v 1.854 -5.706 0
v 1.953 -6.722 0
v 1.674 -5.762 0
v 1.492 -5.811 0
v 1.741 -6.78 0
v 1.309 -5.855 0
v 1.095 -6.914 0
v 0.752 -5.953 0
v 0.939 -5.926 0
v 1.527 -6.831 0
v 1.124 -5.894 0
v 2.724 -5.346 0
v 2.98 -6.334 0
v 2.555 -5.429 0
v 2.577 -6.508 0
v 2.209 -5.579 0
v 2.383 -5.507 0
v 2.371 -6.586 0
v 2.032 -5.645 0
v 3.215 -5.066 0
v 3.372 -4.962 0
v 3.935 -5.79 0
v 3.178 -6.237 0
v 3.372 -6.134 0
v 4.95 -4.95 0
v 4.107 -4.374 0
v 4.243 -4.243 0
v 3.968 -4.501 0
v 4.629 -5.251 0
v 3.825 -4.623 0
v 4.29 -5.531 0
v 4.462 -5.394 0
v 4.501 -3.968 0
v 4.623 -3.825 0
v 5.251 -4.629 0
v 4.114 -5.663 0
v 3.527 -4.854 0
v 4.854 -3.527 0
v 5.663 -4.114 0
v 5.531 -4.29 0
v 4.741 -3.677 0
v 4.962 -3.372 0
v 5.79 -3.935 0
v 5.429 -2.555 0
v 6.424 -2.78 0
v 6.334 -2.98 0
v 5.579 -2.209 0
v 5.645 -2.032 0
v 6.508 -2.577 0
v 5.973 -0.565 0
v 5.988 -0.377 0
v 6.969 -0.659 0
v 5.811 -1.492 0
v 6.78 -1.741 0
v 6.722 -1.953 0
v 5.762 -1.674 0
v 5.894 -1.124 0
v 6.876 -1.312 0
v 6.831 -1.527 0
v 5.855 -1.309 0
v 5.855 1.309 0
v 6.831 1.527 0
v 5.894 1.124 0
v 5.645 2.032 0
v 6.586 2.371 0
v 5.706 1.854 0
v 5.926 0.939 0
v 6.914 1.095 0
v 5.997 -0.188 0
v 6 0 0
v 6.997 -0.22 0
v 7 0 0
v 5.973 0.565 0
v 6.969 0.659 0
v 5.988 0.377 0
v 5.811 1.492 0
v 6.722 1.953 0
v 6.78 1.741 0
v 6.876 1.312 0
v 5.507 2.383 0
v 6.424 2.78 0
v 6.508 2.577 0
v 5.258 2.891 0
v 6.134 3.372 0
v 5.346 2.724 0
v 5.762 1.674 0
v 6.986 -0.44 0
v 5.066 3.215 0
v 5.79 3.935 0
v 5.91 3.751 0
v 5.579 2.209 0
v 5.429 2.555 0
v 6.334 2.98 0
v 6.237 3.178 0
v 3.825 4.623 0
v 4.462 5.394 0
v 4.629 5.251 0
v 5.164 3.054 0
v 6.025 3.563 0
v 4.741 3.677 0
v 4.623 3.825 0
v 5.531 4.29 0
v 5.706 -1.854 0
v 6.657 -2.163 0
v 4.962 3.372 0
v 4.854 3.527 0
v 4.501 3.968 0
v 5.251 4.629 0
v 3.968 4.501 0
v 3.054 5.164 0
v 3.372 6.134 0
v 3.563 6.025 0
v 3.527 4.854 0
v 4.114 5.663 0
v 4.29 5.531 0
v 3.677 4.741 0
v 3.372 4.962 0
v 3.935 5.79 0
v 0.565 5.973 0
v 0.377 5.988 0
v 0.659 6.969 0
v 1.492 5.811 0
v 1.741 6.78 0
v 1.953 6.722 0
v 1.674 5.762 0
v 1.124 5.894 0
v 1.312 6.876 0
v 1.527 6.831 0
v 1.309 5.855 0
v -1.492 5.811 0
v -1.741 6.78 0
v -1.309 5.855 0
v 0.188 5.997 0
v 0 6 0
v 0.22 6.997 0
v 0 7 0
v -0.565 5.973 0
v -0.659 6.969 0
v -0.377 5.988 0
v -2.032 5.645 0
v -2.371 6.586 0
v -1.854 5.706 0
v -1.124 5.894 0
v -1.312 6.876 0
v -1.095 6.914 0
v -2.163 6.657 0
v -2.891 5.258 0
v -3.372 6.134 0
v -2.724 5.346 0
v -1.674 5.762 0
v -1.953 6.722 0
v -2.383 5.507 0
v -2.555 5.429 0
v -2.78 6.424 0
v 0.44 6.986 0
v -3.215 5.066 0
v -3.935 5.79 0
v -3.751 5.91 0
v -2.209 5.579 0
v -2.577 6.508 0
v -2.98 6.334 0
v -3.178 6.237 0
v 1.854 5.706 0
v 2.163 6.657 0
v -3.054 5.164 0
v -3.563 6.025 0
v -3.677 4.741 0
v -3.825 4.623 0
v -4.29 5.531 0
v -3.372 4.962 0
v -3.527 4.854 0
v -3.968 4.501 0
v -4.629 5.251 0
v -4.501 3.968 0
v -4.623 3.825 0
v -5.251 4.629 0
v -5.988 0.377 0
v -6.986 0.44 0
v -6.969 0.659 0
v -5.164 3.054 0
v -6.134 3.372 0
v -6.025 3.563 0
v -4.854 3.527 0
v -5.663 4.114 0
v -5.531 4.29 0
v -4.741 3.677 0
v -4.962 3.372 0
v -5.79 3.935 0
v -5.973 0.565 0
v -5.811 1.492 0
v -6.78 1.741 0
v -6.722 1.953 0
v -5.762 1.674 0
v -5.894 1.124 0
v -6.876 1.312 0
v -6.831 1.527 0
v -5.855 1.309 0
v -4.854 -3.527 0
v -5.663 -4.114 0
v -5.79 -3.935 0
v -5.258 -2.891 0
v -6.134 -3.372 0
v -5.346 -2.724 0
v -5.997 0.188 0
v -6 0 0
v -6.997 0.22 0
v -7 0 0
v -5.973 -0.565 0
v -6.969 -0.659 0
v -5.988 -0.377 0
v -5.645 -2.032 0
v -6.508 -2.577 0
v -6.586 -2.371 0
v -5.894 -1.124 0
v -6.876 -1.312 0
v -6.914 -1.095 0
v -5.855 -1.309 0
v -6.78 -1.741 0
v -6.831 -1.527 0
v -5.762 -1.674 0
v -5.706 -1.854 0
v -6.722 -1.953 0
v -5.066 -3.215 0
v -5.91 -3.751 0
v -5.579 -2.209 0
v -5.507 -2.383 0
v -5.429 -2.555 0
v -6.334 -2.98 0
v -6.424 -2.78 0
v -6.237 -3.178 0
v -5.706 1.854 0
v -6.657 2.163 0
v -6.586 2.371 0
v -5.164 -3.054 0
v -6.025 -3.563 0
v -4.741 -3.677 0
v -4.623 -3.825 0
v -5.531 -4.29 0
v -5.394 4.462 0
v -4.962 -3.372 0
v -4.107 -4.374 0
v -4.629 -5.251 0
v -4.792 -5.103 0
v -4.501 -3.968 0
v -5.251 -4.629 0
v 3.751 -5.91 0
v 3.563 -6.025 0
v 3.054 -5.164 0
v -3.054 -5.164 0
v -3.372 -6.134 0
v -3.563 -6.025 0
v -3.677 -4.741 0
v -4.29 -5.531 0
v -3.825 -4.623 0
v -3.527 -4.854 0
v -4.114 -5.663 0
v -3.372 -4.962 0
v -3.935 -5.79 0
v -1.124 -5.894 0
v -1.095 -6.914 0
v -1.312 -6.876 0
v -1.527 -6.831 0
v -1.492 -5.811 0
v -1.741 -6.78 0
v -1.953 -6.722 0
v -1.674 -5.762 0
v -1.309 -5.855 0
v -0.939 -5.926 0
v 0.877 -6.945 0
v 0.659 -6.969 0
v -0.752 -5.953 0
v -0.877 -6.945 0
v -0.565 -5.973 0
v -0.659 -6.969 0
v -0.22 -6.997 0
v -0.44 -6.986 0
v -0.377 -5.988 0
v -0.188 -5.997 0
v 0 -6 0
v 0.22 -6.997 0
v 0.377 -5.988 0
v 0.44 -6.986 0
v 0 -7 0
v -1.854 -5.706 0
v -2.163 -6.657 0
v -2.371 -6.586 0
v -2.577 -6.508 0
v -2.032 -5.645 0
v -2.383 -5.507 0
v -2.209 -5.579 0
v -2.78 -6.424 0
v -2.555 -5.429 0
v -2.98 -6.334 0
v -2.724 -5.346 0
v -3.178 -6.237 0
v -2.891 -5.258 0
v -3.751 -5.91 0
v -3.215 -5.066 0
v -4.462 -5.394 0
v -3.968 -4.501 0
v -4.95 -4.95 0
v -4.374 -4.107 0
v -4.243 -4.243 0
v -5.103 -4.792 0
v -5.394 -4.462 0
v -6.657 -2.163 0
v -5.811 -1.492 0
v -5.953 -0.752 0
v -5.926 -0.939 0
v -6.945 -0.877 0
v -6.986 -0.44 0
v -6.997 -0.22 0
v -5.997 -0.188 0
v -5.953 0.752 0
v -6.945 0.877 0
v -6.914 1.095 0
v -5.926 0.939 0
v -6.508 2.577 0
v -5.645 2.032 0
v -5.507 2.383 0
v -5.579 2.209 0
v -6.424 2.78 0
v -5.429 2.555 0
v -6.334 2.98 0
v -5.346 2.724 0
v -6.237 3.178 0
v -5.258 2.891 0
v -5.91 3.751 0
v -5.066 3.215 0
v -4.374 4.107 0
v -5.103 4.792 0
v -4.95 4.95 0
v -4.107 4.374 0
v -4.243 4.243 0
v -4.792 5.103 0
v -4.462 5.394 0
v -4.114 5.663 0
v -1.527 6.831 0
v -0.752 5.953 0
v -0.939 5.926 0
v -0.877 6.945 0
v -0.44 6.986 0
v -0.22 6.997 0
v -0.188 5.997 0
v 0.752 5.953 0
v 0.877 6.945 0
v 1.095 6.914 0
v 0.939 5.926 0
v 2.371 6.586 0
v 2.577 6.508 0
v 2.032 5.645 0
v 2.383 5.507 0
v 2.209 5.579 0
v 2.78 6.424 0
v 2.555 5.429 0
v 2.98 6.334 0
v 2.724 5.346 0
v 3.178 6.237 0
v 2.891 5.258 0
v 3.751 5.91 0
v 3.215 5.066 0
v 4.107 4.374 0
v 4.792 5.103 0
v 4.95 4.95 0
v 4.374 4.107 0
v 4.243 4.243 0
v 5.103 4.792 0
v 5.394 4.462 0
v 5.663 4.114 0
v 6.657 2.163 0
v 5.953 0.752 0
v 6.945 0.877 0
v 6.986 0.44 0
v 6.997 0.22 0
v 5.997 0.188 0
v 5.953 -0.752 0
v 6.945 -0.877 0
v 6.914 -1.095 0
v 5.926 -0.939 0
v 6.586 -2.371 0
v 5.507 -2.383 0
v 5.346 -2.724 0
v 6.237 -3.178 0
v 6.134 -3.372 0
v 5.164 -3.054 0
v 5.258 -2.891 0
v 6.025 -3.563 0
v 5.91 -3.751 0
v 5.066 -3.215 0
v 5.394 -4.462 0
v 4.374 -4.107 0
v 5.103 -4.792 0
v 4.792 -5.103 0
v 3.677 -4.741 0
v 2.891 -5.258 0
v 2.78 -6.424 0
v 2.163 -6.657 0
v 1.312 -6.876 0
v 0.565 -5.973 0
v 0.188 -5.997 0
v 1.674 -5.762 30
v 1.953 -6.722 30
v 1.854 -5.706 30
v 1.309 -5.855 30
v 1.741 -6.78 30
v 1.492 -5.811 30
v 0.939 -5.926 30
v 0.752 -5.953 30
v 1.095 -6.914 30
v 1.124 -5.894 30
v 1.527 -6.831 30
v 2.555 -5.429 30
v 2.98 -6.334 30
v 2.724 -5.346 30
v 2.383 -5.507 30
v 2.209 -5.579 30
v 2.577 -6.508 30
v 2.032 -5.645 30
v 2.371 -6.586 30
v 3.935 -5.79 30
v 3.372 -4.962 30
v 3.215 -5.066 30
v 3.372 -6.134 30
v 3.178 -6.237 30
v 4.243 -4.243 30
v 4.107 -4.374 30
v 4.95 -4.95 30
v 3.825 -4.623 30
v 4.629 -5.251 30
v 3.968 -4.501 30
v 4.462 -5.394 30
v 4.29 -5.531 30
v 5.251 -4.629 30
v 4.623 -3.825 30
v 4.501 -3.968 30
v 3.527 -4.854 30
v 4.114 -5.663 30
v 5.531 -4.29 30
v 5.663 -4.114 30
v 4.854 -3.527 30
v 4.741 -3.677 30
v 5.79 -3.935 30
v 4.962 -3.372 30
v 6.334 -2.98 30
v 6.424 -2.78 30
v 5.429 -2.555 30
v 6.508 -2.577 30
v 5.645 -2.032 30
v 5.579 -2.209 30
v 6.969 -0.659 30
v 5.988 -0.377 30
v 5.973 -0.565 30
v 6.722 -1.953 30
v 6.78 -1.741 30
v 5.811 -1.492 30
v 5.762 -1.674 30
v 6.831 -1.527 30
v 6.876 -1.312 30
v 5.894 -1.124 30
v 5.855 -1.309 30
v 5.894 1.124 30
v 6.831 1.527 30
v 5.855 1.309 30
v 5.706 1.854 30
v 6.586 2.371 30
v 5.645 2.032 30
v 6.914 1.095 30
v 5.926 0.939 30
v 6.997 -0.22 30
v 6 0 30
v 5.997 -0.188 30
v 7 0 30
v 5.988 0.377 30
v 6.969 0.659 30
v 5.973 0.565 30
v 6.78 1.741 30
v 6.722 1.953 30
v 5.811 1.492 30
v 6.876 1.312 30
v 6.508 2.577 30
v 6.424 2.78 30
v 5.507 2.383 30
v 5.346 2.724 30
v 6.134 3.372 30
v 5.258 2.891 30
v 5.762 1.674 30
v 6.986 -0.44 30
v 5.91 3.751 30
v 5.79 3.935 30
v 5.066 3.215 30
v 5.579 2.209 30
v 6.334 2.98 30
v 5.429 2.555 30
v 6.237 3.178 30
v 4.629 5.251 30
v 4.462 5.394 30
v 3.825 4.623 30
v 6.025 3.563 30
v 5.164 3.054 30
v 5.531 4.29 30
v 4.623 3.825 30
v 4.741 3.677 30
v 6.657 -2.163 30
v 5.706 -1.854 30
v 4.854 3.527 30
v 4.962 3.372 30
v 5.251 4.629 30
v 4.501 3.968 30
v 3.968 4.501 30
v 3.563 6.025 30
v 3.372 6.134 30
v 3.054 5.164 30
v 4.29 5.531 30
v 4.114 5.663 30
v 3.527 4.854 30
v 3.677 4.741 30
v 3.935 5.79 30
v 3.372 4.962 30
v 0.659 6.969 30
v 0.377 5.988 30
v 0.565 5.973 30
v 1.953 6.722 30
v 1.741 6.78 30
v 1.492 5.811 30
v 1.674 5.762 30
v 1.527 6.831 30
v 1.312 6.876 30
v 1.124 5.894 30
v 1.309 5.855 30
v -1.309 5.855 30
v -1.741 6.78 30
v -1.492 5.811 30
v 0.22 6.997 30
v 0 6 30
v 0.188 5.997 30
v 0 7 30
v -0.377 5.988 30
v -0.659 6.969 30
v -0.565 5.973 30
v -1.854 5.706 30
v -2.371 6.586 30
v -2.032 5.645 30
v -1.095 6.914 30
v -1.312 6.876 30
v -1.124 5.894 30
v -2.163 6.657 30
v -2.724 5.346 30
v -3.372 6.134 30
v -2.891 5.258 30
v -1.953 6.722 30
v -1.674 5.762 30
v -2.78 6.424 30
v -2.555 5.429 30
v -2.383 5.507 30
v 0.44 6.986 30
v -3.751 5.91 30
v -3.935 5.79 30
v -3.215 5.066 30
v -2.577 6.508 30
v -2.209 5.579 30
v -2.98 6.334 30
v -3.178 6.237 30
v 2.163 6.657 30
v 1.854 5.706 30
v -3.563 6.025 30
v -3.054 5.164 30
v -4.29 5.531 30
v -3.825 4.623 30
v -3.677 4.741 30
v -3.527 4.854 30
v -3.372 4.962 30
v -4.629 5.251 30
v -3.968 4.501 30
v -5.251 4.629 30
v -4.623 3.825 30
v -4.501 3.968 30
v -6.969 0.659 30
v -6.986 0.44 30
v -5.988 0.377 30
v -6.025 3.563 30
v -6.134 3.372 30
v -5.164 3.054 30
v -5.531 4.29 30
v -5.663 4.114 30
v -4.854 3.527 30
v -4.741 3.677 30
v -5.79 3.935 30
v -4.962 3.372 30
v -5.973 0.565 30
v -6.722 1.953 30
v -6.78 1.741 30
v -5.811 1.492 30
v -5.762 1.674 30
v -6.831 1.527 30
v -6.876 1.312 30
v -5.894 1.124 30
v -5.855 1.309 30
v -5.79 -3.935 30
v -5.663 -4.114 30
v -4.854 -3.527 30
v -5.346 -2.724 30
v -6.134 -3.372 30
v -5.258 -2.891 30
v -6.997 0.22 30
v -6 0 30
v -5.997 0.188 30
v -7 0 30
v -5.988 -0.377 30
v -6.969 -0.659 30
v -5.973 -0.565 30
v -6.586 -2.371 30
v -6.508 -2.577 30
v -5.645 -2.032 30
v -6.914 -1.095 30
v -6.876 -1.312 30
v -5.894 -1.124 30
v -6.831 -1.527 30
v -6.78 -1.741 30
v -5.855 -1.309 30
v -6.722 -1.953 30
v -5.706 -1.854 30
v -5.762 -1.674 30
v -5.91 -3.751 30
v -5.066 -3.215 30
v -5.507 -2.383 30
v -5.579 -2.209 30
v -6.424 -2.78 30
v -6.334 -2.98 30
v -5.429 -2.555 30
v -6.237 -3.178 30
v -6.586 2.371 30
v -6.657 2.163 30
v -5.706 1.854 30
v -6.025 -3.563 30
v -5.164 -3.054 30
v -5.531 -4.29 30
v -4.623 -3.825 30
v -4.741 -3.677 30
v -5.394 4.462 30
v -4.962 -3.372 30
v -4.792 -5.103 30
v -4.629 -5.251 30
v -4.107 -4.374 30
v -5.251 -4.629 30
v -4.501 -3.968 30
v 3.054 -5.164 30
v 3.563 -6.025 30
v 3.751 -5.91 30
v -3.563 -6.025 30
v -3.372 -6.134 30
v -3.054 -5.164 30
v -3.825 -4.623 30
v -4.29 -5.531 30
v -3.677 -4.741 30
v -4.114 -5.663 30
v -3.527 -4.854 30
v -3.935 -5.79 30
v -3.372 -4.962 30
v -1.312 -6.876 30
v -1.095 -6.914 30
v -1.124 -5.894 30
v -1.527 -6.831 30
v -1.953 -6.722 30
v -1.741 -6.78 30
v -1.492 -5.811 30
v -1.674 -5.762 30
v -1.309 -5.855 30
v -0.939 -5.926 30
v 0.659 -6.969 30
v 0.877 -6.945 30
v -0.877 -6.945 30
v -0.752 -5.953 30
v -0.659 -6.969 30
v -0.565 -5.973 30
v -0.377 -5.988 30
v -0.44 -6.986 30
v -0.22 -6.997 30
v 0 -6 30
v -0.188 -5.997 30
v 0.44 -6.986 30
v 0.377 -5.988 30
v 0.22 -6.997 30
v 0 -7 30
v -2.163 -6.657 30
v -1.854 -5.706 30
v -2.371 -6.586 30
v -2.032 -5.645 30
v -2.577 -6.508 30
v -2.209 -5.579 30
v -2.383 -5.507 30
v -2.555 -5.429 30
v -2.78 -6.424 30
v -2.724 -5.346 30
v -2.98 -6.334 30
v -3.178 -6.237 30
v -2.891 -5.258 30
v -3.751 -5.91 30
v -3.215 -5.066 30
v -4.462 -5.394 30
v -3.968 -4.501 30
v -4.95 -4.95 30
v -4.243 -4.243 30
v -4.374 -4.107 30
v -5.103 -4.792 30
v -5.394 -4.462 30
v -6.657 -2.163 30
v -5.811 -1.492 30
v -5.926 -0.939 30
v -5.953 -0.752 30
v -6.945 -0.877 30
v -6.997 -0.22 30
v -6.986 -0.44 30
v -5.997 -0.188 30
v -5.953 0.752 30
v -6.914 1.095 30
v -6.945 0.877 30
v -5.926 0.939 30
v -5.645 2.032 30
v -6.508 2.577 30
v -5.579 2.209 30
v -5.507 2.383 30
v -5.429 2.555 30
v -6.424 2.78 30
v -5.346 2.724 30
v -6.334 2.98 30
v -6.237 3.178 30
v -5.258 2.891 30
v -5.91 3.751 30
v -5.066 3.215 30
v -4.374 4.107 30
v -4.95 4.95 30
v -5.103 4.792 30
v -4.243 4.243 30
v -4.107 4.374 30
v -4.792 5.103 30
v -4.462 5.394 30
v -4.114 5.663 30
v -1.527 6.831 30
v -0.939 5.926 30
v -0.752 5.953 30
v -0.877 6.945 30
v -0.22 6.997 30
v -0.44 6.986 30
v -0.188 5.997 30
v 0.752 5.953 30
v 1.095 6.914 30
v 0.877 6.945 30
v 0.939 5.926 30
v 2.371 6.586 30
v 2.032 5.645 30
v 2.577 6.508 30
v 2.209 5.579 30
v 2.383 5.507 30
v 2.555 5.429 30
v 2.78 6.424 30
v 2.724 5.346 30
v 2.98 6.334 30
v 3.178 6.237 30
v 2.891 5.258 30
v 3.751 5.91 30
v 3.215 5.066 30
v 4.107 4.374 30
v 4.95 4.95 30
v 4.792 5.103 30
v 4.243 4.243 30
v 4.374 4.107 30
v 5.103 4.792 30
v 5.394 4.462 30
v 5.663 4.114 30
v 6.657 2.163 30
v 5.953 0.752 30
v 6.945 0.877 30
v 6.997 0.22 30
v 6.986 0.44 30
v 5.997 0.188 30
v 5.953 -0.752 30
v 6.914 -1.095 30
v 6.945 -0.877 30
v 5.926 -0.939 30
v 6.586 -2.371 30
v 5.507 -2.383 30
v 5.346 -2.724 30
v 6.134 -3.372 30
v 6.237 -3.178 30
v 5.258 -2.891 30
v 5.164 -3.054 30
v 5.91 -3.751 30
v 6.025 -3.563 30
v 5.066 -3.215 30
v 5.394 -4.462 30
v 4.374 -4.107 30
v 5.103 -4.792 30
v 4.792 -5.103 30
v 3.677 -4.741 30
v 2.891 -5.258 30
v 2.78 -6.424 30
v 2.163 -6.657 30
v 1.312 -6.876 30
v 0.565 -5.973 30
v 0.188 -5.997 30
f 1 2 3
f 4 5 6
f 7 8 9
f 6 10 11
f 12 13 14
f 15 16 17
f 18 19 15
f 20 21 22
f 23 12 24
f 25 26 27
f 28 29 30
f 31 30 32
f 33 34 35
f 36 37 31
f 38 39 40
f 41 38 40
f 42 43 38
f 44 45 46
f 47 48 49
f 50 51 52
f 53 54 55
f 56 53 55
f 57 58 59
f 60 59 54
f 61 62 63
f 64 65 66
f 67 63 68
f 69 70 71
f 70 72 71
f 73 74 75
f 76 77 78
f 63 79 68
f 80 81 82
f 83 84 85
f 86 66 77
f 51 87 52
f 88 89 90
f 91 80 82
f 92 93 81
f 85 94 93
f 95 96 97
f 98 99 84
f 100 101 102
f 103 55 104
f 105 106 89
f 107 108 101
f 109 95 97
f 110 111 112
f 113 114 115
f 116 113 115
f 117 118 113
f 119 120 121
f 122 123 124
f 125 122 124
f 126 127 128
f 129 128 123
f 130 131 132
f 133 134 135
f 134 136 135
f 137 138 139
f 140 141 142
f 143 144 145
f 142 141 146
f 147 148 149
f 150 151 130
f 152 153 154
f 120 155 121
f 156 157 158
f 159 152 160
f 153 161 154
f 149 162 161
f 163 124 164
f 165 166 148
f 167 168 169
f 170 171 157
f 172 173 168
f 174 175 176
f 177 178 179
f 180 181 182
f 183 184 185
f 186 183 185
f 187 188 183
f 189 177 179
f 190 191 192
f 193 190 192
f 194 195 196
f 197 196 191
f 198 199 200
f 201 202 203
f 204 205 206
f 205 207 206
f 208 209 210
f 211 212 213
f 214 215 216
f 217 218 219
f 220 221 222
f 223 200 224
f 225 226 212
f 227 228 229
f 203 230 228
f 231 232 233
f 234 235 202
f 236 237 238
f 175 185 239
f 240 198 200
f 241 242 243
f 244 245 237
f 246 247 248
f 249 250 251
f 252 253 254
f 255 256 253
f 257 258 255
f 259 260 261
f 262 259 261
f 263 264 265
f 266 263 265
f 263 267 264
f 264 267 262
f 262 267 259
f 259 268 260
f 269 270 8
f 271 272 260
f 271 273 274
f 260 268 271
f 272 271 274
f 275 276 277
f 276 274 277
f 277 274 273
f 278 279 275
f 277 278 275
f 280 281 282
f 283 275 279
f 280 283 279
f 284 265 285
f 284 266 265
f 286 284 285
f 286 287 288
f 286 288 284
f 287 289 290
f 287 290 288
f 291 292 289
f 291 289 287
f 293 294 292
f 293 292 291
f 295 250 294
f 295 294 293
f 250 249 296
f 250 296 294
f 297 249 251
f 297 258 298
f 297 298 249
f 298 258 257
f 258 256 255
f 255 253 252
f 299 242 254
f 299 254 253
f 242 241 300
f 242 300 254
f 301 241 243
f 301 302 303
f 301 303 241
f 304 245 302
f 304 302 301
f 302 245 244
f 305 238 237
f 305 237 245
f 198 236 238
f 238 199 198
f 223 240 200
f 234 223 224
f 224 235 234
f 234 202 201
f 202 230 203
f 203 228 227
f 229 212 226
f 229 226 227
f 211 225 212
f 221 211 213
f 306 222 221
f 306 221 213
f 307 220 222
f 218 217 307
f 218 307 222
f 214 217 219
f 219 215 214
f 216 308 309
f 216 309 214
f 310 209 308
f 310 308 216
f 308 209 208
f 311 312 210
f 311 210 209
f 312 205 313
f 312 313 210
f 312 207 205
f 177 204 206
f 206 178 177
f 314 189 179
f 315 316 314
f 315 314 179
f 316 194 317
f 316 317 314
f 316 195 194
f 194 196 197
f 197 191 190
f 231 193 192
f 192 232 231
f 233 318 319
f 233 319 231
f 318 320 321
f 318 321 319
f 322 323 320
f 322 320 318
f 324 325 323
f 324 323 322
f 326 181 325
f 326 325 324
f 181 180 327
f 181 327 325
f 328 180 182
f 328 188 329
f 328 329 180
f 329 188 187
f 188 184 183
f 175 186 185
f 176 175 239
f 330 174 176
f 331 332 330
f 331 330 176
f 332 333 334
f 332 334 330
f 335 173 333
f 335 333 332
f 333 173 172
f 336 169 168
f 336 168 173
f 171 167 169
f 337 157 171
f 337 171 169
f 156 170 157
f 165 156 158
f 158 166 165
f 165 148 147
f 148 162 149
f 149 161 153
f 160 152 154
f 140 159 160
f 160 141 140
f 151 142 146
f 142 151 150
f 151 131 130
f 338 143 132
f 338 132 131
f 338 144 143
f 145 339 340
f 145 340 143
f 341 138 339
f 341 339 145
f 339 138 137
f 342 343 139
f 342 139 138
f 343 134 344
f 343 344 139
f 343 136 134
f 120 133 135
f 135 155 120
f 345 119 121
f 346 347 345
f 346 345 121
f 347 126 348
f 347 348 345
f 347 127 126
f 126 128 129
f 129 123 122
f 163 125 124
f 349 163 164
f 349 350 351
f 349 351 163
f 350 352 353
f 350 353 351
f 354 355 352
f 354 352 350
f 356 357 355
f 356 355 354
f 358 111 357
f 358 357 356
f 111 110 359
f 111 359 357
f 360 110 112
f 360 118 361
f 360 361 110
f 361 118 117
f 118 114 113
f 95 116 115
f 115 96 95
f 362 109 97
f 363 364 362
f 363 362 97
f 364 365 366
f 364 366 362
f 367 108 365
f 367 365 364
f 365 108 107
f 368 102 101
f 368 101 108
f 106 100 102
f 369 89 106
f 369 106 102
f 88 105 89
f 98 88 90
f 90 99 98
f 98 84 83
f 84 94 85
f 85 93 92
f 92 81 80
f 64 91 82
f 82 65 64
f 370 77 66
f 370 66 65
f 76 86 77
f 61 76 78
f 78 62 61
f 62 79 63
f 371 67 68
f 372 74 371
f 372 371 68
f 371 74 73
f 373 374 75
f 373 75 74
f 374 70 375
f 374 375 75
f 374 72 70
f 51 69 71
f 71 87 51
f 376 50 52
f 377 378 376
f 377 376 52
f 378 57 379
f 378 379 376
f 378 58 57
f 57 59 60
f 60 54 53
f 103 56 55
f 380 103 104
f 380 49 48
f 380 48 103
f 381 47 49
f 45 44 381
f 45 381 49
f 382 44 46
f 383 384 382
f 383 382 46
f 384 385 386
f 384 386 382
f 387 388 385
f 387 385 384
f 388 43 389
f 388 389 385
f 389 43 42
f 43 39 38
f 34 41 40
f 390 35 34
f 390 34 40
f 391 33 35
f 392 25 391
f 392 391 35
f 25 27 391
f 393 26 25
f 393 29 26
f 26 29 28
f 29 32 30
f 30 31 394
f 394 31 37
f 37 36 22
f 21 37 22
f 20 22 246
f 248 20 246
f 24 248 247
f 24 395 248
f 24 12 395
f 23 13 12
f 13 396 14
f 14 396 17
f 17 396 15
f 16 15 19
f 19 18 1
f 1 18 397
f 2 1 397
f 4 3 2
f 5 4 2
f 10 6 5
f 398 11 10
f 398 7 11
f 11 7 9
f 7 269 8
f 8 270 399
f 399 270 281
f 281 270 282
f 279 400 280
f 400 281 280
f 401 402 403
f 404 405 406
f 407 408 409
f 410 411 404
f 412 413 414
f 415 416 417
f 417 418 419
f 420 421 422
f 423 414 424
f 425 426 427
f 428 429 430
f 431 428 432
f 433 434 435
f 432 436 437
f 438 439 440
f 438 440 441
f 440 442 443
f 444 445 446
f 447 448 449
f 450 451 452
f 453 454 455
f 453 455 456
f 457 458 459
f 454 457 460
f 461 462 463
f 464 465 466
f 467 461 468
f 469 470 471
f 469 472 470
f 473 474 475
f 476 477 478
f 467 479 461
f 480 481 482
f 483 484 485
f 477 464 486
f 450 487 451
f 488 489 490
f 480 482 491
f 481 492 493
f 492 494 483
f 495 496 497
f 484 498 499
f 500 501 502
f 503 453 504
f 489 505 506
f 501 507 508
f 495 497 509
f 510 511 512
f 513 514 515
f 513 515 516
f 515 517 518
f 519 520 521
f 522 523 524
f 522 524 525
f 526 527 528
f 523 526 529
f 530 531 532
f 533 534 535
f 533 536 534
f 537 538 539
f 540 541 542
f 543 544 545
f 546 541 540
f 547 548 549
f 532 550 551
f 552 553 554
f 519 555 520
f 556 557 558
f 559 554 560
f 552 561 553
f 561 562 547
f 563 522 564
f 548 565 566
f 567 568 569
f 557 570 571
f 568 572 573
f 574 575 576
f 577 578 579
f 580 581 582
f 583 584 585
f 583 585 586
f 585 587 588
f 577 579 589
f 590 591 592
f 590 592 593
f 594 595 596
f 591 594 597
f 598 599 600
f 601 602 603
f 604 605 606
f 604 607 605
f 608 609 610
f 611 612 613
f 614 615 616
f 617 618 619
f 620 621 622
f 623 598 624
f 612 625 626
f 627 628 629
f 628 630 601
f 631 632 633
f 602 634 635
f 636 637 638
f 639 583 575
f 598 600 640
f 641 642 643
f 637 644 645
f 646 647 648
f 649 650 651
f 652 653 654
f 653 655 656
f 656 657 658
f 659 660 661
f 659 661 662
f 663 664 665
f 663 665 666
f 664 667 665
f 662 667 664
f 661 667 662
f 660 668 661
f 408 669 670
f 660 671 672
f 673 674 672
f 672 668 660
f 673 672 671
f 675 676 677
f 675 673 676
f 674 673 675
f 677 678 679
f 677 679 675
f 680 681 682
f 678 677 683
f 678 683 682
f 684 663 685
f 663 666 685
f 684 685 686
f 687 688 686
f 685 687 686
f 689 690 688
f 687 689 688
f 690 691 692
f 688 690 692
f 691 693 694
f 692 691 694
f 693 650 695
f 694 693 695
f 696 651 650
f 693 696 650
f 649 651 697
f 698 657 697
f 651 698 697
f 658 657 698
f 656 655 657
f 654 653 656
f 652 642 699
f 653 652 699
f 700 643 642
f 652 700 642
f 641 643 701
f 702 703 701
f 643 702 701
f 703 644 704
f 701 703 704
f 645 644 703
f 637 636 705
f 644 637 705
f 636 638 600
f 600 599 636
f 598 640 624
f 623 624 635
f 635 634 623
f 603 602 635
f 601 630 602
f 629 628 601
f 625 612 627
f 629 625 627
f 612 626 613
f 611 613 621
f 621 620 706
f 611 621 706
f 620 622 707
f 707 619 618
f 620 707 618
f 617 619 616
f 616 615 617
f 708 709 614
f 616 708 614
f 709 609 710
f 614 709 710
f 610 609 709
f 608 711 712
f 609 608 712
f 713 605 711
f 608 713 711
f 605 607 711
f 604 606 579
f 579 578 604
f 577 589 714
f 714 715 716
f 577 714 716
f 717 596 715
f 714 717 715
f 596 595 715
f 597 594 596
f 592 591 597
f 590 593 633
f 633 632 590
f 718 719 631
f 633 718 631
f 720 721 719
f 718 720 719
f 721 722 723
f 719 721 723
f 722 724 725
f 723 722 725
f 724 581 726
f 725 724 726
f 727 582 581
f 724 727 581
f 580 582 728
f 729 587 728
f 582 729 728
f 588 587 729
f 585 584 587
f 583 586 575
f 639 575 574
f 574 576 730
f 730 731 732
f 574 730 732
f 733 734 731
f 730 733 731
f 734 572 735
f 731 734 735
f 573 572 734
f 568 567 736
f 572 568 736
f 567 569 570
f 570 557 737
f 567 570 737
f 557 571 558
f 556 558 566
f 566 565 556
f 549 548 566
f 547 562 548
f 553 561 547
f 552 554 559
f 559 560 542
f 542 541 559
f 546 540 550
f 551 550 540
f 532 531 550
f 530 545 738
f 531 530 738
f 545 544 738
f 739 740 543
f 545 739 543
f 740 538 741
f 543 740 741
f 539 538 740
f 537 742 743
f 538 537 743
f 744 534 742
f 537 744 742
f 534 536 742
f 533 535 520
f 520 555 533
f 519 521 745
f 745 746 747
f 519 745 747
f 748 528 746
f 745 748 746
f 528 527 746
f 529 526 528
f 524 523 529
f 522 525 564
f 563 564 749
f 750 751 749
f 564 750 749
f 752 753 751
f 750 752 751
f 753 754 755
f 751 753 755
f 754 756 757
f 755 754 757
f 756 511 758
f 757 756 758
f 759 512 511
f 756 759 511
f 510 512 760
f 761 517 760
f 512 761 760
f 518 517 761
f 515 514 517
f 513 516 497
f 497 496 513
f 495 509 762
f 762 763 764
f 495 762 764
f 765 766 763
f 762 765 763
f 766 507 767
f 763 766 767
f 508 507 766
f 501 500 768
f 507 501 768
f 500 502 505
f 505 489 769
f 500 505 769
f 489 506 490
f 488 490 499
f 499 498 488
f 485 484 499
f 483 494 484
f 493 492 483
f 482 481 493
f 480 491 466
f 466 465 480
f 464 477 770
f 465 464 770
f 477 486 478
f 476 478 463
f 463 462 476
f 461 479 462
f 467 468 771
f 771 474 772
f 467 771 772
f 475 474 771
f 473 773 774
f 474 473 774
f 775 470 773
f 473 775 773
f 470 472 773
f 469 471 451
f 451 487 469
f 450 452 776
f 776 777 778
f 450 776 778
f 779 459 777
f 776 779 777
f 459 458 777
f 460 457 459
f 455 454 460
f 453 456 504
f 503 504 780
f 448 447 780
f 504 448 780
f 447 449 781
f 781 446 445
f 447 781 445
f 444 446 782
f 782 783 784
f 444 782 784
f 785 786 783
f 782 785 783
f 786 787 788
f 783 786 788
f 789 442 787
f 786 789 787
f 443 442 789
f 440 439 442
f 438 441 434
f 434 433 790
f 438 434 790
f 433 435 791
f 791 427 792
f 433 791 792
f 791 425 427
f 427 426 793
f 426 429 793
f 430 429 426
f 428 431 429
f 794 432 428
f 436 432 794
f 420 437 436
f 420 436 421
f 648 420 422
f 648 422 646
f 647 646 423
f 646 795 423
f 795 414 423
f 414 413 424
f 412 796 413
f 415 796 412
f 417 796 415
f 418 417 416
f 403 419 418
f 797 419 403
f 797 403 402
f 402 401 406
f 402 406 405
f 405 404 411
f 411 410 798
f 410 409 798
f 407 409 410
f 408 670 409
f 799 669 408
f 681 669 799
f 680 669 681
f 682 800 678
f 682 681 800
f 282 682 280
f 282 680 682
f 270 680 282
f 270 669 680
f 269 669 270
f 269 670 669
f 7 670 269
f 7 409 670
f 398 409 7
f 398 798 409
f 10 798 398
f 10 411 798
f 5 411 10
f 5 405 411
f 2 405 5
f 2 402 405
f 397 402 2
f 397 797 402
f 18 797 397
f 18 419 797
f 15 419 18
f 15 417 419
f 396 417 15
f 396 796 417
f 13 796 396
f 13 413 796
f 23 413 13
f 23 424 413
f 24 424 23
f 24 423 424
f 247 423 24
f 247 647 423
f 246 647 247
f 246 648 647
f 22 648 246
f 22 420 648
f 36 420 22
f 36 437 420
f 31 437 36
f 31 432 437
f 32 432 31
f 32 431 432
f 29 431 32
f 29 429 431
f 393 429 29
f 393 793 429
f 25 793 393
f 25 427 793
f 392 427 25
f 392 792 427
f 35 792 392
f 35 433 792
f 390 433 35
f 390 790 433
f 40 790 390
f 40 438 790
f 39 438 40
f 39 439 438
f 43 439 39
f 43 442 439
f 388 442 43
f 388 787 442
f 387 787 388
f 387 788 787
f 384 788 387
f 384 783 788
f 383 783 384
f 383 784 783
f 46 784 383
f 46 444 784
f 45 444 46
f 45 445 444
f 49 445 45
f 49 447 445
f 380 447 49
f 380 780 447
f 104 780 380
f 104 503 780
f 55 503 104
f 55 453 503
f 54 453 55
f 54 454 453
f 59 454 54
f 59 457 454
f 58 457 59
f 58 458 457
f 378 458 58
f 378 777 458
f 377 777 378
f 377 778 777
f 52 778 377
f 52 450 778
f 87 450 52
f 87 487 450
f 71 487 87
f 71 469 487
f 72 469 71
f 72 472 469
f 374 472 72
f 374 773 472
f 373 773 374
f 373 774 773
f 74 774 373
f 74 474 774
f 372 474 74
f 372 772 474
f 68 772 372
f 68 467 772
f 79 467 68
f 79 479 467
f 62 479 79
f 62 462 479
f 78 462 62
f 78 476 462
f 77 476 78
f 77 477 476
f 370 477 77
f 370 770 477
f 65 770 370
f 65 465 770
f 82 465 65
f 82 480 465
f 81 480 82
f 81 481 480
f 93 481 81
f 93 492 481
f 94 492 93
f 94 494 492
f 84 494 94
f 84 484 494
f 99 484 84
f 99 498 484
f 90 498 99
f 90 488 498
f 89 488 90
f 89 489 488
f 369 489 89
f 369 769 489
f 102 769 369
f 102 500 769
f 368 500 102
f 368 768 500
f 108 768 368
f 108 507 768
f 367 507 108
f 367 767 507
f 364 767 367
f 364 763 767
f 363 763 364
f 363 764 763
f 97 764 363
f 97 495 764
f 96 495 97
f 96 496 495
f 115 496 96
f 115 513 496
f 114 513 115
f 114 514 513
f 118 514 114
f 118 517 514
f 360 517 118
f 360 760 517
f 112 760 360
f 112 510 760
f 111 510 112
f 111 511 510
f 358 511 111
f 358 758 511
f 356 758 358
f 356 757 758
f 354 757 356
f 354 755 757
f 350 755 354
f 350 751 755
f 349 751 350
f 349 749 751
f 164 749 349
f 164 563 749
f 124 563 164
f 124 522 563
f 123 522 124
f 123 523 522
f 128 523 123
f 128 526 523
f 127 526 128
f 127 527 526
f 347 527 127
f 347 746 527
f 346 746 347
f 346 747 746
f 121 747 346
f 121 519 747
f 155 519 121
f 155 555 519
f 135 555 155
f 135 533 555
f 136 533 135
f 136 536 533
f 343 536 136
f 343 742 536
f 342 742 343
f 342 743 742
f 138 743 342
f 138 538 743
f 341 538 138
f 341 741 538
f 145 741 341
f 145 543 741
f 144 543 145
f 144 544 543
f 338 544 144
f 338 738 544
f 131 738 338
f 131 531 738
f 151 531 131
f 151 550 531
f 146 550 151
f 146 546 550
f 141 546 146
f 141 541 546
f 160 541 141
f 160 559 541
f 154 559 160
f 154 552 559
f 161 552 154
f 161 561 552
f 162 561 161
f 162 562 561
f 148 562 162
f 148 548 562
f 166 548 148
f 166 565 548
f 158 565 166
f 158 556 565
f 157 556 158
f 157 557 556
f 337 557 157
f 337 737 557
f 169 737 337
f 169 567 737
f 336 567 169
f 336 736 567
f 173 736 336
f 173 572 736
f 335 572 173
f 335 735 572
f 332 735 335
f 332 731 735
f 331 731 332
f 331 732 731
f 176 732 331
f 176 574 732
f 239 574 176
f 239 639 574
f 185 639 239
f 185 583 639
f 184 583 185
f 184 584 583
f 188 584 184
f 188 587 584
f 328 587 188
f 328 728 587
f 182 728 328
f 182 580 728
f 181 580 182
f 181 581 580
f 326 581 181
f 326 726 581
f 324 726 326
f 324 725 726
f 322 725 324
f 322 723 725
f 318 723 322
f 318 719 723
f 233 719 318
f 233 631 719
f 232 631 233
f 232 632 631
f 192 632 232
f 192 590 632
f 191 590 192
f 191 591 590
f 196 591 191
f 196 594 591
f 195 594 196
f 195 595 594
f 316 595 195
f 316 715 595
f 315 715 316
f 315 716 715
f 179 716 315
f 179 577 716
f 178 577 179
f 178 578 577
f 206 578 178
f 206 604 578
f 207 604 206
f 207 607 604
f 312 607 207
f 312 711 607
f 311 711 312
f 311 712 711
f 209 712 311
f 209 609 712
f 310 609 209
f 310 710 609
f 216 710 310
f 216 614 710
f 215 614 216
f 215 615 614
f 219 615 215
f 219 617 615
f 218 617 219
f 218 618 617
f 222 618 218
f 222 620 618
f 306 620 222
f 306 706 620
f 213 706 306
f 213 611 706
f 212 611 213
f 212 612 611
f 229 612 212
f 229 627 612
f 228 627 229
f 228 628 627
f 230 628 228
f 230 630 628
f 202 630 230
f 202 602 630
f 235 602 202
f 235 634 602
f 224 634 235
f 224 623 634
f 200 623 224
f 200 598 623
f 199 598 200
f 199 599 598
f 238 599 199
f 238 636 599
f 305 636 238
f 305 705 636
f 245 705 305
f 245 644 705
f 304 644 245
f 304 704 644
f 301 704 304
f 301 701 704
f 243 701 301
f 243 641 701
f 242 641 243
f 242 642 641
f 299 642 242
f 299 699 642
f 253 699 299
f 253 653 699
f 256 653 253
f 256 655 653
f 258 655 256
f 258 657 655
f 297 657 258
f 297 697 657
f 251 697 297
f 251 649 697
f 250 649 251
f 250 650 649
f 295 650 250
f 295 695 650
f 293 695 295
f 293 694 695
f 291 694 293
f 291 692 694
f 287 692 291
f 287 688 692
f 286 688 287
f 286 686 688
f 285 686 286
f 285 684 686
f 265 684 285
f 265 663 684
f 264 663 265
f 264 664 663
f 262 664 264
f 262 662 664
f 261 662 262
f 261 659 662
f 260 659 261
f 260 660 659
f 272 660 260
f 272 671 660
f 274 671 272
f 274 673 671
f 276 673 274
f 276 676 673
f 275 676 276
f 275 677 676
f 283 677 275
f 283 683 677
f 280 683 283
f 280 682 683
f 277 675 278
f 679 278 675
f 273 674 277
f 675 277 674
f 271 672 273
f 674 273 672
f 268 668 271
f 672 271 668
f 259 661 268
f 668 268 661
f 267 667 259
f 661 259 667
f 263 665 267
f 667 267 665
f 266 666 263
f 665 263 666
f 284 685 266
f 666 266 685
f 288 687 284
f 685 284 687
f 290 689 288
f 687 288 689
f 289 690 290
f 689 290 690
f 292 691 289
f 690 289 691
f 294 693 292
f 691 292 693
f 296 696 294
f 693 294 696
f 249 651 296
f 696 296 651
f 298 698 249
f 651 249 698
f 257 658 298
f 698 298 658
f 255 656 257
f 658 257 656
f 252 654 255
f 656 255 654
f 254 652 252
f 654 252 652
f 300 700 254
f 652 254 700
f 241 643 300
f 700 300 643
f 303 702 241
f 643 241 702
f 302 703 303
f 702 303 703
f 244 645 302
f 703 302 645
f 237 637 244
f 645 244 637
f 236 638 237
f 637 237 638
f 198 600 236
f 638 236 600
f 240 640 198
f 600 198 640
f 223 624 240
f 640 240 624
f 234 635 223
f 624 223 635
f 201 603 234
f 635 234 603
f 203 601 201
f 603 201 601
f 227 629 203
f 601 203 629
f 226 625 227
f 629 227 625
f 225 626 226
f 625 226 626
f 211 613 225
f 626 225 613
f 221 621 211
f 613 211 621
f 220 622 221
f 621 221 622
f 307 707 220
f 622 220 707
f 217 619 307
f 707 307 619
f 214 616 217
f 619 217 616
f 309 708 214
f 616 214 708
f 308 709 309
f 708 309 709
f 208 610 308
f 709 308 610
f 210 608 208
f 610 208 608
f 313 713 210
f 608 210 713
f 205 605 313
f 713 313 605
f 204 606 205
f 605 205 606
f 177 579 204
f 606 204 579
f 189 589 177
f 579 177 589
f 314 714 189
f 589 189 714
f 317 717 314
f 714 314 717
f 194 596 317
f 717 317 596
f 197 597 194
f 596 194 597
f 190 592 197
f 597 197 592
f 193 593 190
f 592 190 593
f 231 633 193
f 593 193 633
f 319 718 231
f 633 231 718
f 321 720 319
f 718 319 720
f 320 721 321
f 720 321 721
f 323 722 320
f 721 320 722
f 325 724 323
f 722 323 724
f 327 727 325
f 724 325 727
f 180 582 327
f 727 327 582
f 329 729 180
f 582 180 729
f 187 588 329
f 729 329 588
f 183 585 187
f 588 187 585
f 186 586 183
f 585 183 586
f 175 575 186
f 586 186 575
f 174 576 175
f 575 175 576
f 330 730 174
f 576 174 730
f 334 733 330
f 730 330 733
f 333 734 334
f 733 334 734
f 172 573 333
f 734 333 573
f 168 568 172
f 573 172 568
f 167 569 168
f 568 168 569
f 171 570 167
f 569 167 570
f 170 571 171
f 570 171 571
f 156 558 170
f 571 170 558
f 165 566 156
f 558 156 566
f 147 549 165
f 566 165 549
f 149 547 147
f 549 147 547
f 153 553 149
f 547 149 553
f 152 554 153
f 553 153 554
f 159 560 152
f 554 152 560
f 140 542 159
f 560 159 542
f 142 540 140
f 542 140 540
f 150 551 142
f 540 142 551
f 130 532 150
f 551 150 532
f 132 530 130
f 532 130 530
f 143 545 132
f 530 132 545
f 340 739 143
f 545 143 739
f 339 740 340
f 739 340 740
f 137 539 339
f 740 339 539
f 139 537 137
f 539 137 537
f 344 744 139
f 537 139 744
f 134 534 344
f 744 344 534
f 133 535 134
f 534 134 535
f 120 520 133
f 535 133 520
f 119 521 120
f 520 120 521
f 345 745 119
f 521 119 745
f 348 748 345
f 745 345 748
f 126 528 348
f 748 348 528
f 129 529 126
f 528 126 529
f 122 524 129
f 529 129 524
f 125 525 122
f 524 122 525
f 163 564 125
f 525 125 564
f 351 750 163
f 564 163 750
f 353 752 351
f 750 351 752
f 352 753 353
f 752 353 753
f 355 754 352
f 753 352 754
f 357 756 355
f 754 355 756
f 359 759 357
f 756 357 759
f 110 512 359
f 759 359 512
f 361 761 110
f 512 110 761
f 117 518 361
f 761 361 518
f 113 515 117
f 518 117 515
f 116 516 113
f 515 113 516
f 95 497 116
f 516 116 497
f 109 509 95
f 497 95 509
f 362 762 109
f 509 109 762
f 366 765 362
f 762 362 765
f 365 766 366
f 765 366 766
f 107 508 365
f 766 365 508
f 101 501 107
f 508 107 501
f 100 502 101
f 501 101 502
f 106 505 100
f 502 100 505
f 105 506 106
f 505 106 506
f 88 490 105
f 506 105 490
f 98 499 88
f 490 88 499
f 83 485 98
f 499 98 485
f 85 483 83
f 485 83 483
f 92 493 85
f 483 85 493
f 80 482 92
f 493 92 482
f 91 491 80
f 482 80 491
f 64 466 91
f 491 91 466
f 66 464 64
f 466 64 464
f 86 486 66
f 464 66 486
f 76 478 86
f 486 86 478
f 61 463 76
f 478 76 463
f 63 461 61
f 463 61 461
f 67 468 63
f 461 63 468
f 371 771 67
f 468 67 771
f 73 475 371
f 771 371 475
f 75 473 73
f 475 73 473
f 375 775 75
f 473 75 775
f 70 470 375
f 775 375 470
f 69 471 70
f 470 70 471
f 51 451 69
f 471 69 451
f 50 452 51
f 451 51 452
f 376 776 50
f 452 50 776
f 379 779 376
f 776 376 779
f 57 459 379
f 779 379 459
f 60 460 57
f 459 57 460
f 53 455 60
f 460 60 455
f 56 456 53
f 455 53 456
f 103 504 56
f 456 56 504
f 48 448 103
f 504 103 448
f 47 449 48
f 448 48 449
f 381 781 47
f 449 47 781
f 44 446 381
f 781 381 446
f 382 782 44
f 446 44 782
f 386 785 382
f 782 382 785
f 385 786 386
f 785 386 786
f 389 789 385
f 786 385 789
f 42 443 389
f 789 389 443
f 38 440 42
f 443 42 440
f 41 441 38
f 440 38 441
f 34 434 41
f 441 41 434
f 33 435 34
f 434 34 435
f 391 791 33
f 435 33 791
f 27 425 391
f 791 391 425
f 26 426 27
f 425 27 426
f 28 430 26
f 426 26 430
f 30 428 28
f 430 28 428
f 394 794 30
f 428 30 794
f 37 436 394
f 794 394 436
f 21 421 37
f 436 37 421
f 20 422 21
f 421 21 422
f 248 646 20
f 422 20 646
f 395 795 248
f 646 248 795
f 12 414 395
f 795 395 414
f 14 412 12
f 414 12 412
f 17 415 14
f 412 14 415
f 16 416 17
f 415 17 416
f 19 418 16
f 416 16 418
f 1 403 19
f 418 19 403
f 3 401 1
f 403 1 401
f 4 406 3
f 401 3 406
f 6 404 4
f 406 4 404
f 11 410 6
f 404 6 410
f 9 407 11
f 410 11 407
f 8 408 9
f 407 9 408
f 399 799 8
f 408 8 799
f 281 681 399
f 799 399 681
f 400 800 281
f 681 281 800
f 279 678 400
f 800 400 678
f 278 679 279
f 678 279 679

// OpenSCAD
// file: parameters.scad
$fn = 200;
fit = 1.01;

launch_pad_d = 50;
launch_pad_h = 22.5;
launch_pad_stopper_h = 30;
launch_pad_stopper_thickness = 2;

launch_pad_nutcatch_offset = 14;
launch_pad_nutcatch_depth = 17;

launch_pad_recess_h = 10;
launch_pad_recess_width = 12;
launch_pad_recess_depth = 14;
launch_pad_recess_nutcatch_offset = 9.5;

launch_pad_rod_fit = 1.2;
launch_pad_rod_d = 10 * launch_pad_rod_fit;

leg_width = 17.5;
leg_mount_depth = 3;

leg_external_mount_depth = 10;
leg_external_mount_width = 3;
leg_external_mount_ridge_width = 4;
leg_external_mount_h = 8.5;
// main file
include <parameters.scad>;

module guide_node_stopper () {
  linear_extrude (launch_pad_stopper_h) {
    difference () {
      circle(d = launch_pad_rod_d + launch_pad_stopper_thickness);
      circle(d = launch_pad_rod_d);
    }
  }
}

guide_node_stopper();
